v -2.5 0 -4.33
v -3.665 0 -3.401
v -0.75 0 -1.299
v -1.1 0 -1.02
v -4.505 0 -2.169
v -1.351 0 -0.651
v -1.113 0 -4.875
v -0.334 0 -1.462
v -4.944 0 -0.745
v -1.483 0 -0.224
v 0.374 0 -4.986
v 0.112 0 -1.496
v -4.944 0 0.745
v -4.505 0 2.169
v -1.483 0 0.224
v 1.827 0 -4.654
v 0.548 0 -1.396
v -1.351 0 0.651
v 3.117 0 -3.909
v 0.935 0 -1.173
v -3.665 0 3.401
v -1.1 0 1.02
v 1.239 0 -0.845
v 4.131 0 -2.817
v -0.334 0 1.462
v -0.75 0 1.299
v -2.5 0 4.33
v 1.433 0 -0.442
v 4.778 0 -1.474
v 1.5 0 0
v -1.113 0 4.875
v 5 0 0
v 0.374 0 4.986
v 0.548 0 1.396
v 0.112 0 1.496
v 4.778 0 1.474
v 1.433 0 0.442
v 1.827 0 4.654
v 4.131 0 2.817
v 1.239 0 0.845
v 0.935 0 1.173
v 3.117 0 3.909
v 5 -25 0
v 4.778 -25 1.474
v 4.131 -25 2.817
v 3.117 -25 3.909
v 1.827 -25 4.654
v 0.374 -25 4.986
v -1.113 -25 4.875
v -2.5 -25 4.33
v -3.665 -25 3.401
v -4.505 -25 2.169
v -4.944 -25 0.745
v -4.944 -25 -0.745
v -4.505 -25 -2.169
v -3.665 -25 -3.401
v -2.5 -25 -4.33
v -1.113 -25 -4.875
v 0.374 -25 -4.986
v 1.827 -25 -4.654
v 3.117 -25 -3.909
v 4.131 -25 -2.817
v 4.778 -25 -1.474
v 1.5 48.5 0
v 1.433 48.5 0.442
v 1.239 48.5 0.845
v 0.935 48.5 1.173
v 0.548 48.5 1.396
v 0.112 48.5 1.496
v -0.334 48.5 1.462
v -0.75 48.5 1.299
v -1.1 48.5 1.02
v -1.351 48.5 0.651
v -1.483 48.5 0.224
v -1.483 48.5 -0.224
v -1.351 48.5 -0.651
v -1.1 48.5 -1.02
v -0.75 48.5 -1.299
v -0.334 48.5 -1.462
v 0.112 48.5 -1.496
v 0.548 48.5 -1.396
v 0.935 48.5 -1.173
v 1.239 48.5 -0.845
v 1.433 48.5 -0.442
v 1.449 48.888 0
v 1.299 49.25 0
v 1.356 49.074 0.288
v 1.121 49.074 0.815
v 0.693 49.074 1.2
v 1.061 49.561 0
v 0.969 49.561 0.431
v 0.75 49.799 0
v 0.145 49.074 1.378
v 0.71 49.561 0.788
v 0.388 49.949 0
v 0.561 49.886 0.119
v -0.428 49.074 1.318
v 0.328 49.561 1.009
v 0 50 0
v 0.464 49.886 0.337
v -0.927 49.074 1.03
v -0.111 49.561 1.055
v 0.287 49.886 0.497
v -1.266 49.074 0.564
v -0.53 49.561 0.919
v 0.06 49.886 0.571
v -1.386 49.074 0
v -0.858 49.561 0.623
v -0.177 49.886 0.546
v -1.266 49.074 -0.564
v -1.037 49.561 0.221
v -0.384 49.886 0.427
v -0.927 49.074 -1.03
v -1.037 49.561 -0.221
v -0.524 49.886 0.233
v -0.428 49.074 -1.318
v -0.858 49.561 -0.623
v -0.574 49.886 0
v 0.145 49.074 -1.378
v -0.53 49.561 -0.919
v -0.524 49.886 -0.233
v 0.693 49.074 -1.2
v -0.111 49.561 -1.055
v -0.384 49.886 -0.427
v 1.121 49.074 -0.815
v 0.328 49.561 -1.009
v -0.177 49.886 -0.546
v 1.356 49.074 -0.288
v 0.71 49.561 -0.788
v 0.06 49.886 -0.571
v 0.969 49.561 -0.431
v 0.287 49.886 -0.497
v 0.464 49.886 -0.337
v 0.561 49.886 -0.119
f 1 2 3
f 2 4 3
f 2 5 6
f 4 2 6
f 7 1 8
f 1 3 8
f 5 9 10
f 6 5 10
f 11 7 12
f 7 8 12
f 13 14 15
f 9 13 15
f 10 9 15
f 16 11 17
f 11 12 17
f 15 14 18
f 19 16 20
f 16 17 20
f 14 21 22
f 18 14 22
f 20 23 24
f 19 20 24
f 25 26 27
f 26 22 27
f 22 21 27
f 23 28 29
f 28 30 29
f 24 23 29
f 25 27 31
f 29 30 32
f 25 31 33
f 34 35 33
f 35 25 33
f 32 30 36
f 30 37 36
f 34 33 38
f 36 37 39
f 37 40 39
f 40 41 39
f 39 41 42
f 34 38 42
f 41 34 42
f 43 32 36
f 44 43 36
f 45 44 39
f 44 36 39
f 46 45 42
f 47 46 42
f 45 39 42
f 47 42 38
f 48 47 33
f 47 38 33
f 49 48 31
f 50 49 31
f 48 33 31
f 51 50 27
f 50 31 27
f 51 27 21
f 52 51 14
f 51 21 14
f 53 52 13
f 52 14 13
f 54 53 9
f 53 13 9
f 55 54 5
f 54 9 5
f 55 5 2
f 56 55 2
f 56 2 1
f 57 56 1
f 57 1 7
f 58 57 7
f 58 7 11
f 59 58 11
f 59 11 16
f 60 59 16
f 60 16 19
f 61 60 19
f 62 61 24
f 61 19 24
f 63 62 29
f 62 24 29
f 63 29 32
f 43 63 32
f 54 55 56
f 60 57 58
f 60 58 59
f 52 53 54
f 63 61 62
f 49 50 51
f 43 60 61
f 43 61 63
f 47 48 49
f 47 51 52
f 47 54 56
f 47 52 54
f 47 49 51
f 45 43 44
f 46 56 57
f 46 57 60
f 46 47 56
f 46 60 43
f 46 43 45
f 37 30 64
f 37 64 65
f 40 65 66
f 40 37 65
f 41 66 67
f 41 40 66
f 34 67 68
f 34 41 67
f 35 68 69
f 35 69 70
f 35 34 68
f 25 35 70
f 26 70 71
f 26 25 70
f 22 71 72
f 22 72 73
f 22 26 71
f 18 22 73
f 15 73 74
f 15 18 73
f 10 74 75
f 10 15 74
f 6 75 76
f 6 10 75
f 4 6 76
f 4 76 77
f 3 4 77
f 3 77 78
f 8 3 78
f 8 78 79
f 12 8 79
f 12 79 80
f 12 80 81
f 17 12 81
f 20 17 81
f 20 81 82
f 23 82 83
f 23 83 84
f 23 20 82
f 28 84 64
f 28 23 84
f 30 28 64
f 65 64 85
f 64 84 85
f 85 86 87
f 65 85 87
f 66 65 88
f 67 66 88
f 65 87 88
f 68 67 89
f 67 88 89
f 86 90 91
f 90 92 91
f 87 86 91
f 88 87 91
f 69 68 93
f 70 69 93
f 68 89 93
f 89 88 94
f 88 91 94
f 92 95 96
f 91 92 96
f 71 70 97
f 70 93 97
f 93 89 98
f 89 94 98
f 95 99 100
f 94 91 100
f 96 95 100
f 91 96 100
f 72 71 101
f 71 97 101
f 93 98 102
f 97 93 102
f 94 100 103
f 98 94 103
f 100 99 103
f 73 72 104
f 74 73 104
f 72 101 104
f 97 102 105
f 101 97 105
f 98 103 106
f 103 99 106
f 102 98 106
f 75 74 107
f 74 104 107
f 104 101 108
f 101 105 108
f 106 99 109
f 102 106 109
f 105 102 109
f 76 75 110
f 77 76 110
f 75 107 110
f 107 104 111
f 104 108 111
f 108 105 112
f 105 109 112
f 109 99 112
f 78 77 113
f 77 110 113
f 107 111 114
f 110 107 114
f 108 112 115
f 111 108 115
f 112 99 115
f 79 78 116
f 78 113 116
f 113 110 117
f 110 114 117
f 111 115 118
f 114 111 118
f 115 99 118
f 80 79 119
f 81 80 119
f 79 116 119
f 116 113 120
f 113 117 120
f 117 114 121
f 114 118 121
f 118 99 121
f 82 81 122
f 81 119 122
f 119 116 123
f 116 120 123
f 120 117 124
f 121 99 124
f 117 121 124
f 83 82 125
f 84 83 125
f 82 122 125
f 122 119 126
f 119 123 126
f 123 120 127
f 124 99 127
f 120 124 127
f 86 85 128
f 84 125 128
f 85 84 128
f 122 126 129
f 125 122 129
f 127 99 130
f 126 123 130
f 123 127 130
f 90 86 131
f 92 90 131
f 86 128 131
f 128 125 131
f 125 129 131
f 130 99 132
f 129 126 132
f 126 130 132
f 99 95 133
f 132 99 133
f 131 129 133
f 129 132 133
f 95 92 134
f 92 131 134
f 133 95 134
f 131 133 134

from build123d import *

# Parameters (mm, degrees)
F0_R     = 1.5
F1_DEPTH = 50
F2_R     = 5
F3_DEPTH = 25
F4_R     = 1.5


with BuildPart() as f1:
    # F0 (on Front) → F1 (new body)
    with BuildSketch(Plane.XZ):
        Circle(F0_R)
    extrude(amount=-F1_DEPTH)

    # F2 (on Front) → F3 (join)
    with BuildSketch(Plane.XZ):
        Circle(F2_R)
    extrude(amount=F3_DEPTH)

    # F4
    f4_edges = [f1.edges().sort_by_distance(p)[0] for p in [
        (-1.5, 50, 0),
    ]]
    fillet(f4_edges, radius=F4_R)


solid = f1.part
